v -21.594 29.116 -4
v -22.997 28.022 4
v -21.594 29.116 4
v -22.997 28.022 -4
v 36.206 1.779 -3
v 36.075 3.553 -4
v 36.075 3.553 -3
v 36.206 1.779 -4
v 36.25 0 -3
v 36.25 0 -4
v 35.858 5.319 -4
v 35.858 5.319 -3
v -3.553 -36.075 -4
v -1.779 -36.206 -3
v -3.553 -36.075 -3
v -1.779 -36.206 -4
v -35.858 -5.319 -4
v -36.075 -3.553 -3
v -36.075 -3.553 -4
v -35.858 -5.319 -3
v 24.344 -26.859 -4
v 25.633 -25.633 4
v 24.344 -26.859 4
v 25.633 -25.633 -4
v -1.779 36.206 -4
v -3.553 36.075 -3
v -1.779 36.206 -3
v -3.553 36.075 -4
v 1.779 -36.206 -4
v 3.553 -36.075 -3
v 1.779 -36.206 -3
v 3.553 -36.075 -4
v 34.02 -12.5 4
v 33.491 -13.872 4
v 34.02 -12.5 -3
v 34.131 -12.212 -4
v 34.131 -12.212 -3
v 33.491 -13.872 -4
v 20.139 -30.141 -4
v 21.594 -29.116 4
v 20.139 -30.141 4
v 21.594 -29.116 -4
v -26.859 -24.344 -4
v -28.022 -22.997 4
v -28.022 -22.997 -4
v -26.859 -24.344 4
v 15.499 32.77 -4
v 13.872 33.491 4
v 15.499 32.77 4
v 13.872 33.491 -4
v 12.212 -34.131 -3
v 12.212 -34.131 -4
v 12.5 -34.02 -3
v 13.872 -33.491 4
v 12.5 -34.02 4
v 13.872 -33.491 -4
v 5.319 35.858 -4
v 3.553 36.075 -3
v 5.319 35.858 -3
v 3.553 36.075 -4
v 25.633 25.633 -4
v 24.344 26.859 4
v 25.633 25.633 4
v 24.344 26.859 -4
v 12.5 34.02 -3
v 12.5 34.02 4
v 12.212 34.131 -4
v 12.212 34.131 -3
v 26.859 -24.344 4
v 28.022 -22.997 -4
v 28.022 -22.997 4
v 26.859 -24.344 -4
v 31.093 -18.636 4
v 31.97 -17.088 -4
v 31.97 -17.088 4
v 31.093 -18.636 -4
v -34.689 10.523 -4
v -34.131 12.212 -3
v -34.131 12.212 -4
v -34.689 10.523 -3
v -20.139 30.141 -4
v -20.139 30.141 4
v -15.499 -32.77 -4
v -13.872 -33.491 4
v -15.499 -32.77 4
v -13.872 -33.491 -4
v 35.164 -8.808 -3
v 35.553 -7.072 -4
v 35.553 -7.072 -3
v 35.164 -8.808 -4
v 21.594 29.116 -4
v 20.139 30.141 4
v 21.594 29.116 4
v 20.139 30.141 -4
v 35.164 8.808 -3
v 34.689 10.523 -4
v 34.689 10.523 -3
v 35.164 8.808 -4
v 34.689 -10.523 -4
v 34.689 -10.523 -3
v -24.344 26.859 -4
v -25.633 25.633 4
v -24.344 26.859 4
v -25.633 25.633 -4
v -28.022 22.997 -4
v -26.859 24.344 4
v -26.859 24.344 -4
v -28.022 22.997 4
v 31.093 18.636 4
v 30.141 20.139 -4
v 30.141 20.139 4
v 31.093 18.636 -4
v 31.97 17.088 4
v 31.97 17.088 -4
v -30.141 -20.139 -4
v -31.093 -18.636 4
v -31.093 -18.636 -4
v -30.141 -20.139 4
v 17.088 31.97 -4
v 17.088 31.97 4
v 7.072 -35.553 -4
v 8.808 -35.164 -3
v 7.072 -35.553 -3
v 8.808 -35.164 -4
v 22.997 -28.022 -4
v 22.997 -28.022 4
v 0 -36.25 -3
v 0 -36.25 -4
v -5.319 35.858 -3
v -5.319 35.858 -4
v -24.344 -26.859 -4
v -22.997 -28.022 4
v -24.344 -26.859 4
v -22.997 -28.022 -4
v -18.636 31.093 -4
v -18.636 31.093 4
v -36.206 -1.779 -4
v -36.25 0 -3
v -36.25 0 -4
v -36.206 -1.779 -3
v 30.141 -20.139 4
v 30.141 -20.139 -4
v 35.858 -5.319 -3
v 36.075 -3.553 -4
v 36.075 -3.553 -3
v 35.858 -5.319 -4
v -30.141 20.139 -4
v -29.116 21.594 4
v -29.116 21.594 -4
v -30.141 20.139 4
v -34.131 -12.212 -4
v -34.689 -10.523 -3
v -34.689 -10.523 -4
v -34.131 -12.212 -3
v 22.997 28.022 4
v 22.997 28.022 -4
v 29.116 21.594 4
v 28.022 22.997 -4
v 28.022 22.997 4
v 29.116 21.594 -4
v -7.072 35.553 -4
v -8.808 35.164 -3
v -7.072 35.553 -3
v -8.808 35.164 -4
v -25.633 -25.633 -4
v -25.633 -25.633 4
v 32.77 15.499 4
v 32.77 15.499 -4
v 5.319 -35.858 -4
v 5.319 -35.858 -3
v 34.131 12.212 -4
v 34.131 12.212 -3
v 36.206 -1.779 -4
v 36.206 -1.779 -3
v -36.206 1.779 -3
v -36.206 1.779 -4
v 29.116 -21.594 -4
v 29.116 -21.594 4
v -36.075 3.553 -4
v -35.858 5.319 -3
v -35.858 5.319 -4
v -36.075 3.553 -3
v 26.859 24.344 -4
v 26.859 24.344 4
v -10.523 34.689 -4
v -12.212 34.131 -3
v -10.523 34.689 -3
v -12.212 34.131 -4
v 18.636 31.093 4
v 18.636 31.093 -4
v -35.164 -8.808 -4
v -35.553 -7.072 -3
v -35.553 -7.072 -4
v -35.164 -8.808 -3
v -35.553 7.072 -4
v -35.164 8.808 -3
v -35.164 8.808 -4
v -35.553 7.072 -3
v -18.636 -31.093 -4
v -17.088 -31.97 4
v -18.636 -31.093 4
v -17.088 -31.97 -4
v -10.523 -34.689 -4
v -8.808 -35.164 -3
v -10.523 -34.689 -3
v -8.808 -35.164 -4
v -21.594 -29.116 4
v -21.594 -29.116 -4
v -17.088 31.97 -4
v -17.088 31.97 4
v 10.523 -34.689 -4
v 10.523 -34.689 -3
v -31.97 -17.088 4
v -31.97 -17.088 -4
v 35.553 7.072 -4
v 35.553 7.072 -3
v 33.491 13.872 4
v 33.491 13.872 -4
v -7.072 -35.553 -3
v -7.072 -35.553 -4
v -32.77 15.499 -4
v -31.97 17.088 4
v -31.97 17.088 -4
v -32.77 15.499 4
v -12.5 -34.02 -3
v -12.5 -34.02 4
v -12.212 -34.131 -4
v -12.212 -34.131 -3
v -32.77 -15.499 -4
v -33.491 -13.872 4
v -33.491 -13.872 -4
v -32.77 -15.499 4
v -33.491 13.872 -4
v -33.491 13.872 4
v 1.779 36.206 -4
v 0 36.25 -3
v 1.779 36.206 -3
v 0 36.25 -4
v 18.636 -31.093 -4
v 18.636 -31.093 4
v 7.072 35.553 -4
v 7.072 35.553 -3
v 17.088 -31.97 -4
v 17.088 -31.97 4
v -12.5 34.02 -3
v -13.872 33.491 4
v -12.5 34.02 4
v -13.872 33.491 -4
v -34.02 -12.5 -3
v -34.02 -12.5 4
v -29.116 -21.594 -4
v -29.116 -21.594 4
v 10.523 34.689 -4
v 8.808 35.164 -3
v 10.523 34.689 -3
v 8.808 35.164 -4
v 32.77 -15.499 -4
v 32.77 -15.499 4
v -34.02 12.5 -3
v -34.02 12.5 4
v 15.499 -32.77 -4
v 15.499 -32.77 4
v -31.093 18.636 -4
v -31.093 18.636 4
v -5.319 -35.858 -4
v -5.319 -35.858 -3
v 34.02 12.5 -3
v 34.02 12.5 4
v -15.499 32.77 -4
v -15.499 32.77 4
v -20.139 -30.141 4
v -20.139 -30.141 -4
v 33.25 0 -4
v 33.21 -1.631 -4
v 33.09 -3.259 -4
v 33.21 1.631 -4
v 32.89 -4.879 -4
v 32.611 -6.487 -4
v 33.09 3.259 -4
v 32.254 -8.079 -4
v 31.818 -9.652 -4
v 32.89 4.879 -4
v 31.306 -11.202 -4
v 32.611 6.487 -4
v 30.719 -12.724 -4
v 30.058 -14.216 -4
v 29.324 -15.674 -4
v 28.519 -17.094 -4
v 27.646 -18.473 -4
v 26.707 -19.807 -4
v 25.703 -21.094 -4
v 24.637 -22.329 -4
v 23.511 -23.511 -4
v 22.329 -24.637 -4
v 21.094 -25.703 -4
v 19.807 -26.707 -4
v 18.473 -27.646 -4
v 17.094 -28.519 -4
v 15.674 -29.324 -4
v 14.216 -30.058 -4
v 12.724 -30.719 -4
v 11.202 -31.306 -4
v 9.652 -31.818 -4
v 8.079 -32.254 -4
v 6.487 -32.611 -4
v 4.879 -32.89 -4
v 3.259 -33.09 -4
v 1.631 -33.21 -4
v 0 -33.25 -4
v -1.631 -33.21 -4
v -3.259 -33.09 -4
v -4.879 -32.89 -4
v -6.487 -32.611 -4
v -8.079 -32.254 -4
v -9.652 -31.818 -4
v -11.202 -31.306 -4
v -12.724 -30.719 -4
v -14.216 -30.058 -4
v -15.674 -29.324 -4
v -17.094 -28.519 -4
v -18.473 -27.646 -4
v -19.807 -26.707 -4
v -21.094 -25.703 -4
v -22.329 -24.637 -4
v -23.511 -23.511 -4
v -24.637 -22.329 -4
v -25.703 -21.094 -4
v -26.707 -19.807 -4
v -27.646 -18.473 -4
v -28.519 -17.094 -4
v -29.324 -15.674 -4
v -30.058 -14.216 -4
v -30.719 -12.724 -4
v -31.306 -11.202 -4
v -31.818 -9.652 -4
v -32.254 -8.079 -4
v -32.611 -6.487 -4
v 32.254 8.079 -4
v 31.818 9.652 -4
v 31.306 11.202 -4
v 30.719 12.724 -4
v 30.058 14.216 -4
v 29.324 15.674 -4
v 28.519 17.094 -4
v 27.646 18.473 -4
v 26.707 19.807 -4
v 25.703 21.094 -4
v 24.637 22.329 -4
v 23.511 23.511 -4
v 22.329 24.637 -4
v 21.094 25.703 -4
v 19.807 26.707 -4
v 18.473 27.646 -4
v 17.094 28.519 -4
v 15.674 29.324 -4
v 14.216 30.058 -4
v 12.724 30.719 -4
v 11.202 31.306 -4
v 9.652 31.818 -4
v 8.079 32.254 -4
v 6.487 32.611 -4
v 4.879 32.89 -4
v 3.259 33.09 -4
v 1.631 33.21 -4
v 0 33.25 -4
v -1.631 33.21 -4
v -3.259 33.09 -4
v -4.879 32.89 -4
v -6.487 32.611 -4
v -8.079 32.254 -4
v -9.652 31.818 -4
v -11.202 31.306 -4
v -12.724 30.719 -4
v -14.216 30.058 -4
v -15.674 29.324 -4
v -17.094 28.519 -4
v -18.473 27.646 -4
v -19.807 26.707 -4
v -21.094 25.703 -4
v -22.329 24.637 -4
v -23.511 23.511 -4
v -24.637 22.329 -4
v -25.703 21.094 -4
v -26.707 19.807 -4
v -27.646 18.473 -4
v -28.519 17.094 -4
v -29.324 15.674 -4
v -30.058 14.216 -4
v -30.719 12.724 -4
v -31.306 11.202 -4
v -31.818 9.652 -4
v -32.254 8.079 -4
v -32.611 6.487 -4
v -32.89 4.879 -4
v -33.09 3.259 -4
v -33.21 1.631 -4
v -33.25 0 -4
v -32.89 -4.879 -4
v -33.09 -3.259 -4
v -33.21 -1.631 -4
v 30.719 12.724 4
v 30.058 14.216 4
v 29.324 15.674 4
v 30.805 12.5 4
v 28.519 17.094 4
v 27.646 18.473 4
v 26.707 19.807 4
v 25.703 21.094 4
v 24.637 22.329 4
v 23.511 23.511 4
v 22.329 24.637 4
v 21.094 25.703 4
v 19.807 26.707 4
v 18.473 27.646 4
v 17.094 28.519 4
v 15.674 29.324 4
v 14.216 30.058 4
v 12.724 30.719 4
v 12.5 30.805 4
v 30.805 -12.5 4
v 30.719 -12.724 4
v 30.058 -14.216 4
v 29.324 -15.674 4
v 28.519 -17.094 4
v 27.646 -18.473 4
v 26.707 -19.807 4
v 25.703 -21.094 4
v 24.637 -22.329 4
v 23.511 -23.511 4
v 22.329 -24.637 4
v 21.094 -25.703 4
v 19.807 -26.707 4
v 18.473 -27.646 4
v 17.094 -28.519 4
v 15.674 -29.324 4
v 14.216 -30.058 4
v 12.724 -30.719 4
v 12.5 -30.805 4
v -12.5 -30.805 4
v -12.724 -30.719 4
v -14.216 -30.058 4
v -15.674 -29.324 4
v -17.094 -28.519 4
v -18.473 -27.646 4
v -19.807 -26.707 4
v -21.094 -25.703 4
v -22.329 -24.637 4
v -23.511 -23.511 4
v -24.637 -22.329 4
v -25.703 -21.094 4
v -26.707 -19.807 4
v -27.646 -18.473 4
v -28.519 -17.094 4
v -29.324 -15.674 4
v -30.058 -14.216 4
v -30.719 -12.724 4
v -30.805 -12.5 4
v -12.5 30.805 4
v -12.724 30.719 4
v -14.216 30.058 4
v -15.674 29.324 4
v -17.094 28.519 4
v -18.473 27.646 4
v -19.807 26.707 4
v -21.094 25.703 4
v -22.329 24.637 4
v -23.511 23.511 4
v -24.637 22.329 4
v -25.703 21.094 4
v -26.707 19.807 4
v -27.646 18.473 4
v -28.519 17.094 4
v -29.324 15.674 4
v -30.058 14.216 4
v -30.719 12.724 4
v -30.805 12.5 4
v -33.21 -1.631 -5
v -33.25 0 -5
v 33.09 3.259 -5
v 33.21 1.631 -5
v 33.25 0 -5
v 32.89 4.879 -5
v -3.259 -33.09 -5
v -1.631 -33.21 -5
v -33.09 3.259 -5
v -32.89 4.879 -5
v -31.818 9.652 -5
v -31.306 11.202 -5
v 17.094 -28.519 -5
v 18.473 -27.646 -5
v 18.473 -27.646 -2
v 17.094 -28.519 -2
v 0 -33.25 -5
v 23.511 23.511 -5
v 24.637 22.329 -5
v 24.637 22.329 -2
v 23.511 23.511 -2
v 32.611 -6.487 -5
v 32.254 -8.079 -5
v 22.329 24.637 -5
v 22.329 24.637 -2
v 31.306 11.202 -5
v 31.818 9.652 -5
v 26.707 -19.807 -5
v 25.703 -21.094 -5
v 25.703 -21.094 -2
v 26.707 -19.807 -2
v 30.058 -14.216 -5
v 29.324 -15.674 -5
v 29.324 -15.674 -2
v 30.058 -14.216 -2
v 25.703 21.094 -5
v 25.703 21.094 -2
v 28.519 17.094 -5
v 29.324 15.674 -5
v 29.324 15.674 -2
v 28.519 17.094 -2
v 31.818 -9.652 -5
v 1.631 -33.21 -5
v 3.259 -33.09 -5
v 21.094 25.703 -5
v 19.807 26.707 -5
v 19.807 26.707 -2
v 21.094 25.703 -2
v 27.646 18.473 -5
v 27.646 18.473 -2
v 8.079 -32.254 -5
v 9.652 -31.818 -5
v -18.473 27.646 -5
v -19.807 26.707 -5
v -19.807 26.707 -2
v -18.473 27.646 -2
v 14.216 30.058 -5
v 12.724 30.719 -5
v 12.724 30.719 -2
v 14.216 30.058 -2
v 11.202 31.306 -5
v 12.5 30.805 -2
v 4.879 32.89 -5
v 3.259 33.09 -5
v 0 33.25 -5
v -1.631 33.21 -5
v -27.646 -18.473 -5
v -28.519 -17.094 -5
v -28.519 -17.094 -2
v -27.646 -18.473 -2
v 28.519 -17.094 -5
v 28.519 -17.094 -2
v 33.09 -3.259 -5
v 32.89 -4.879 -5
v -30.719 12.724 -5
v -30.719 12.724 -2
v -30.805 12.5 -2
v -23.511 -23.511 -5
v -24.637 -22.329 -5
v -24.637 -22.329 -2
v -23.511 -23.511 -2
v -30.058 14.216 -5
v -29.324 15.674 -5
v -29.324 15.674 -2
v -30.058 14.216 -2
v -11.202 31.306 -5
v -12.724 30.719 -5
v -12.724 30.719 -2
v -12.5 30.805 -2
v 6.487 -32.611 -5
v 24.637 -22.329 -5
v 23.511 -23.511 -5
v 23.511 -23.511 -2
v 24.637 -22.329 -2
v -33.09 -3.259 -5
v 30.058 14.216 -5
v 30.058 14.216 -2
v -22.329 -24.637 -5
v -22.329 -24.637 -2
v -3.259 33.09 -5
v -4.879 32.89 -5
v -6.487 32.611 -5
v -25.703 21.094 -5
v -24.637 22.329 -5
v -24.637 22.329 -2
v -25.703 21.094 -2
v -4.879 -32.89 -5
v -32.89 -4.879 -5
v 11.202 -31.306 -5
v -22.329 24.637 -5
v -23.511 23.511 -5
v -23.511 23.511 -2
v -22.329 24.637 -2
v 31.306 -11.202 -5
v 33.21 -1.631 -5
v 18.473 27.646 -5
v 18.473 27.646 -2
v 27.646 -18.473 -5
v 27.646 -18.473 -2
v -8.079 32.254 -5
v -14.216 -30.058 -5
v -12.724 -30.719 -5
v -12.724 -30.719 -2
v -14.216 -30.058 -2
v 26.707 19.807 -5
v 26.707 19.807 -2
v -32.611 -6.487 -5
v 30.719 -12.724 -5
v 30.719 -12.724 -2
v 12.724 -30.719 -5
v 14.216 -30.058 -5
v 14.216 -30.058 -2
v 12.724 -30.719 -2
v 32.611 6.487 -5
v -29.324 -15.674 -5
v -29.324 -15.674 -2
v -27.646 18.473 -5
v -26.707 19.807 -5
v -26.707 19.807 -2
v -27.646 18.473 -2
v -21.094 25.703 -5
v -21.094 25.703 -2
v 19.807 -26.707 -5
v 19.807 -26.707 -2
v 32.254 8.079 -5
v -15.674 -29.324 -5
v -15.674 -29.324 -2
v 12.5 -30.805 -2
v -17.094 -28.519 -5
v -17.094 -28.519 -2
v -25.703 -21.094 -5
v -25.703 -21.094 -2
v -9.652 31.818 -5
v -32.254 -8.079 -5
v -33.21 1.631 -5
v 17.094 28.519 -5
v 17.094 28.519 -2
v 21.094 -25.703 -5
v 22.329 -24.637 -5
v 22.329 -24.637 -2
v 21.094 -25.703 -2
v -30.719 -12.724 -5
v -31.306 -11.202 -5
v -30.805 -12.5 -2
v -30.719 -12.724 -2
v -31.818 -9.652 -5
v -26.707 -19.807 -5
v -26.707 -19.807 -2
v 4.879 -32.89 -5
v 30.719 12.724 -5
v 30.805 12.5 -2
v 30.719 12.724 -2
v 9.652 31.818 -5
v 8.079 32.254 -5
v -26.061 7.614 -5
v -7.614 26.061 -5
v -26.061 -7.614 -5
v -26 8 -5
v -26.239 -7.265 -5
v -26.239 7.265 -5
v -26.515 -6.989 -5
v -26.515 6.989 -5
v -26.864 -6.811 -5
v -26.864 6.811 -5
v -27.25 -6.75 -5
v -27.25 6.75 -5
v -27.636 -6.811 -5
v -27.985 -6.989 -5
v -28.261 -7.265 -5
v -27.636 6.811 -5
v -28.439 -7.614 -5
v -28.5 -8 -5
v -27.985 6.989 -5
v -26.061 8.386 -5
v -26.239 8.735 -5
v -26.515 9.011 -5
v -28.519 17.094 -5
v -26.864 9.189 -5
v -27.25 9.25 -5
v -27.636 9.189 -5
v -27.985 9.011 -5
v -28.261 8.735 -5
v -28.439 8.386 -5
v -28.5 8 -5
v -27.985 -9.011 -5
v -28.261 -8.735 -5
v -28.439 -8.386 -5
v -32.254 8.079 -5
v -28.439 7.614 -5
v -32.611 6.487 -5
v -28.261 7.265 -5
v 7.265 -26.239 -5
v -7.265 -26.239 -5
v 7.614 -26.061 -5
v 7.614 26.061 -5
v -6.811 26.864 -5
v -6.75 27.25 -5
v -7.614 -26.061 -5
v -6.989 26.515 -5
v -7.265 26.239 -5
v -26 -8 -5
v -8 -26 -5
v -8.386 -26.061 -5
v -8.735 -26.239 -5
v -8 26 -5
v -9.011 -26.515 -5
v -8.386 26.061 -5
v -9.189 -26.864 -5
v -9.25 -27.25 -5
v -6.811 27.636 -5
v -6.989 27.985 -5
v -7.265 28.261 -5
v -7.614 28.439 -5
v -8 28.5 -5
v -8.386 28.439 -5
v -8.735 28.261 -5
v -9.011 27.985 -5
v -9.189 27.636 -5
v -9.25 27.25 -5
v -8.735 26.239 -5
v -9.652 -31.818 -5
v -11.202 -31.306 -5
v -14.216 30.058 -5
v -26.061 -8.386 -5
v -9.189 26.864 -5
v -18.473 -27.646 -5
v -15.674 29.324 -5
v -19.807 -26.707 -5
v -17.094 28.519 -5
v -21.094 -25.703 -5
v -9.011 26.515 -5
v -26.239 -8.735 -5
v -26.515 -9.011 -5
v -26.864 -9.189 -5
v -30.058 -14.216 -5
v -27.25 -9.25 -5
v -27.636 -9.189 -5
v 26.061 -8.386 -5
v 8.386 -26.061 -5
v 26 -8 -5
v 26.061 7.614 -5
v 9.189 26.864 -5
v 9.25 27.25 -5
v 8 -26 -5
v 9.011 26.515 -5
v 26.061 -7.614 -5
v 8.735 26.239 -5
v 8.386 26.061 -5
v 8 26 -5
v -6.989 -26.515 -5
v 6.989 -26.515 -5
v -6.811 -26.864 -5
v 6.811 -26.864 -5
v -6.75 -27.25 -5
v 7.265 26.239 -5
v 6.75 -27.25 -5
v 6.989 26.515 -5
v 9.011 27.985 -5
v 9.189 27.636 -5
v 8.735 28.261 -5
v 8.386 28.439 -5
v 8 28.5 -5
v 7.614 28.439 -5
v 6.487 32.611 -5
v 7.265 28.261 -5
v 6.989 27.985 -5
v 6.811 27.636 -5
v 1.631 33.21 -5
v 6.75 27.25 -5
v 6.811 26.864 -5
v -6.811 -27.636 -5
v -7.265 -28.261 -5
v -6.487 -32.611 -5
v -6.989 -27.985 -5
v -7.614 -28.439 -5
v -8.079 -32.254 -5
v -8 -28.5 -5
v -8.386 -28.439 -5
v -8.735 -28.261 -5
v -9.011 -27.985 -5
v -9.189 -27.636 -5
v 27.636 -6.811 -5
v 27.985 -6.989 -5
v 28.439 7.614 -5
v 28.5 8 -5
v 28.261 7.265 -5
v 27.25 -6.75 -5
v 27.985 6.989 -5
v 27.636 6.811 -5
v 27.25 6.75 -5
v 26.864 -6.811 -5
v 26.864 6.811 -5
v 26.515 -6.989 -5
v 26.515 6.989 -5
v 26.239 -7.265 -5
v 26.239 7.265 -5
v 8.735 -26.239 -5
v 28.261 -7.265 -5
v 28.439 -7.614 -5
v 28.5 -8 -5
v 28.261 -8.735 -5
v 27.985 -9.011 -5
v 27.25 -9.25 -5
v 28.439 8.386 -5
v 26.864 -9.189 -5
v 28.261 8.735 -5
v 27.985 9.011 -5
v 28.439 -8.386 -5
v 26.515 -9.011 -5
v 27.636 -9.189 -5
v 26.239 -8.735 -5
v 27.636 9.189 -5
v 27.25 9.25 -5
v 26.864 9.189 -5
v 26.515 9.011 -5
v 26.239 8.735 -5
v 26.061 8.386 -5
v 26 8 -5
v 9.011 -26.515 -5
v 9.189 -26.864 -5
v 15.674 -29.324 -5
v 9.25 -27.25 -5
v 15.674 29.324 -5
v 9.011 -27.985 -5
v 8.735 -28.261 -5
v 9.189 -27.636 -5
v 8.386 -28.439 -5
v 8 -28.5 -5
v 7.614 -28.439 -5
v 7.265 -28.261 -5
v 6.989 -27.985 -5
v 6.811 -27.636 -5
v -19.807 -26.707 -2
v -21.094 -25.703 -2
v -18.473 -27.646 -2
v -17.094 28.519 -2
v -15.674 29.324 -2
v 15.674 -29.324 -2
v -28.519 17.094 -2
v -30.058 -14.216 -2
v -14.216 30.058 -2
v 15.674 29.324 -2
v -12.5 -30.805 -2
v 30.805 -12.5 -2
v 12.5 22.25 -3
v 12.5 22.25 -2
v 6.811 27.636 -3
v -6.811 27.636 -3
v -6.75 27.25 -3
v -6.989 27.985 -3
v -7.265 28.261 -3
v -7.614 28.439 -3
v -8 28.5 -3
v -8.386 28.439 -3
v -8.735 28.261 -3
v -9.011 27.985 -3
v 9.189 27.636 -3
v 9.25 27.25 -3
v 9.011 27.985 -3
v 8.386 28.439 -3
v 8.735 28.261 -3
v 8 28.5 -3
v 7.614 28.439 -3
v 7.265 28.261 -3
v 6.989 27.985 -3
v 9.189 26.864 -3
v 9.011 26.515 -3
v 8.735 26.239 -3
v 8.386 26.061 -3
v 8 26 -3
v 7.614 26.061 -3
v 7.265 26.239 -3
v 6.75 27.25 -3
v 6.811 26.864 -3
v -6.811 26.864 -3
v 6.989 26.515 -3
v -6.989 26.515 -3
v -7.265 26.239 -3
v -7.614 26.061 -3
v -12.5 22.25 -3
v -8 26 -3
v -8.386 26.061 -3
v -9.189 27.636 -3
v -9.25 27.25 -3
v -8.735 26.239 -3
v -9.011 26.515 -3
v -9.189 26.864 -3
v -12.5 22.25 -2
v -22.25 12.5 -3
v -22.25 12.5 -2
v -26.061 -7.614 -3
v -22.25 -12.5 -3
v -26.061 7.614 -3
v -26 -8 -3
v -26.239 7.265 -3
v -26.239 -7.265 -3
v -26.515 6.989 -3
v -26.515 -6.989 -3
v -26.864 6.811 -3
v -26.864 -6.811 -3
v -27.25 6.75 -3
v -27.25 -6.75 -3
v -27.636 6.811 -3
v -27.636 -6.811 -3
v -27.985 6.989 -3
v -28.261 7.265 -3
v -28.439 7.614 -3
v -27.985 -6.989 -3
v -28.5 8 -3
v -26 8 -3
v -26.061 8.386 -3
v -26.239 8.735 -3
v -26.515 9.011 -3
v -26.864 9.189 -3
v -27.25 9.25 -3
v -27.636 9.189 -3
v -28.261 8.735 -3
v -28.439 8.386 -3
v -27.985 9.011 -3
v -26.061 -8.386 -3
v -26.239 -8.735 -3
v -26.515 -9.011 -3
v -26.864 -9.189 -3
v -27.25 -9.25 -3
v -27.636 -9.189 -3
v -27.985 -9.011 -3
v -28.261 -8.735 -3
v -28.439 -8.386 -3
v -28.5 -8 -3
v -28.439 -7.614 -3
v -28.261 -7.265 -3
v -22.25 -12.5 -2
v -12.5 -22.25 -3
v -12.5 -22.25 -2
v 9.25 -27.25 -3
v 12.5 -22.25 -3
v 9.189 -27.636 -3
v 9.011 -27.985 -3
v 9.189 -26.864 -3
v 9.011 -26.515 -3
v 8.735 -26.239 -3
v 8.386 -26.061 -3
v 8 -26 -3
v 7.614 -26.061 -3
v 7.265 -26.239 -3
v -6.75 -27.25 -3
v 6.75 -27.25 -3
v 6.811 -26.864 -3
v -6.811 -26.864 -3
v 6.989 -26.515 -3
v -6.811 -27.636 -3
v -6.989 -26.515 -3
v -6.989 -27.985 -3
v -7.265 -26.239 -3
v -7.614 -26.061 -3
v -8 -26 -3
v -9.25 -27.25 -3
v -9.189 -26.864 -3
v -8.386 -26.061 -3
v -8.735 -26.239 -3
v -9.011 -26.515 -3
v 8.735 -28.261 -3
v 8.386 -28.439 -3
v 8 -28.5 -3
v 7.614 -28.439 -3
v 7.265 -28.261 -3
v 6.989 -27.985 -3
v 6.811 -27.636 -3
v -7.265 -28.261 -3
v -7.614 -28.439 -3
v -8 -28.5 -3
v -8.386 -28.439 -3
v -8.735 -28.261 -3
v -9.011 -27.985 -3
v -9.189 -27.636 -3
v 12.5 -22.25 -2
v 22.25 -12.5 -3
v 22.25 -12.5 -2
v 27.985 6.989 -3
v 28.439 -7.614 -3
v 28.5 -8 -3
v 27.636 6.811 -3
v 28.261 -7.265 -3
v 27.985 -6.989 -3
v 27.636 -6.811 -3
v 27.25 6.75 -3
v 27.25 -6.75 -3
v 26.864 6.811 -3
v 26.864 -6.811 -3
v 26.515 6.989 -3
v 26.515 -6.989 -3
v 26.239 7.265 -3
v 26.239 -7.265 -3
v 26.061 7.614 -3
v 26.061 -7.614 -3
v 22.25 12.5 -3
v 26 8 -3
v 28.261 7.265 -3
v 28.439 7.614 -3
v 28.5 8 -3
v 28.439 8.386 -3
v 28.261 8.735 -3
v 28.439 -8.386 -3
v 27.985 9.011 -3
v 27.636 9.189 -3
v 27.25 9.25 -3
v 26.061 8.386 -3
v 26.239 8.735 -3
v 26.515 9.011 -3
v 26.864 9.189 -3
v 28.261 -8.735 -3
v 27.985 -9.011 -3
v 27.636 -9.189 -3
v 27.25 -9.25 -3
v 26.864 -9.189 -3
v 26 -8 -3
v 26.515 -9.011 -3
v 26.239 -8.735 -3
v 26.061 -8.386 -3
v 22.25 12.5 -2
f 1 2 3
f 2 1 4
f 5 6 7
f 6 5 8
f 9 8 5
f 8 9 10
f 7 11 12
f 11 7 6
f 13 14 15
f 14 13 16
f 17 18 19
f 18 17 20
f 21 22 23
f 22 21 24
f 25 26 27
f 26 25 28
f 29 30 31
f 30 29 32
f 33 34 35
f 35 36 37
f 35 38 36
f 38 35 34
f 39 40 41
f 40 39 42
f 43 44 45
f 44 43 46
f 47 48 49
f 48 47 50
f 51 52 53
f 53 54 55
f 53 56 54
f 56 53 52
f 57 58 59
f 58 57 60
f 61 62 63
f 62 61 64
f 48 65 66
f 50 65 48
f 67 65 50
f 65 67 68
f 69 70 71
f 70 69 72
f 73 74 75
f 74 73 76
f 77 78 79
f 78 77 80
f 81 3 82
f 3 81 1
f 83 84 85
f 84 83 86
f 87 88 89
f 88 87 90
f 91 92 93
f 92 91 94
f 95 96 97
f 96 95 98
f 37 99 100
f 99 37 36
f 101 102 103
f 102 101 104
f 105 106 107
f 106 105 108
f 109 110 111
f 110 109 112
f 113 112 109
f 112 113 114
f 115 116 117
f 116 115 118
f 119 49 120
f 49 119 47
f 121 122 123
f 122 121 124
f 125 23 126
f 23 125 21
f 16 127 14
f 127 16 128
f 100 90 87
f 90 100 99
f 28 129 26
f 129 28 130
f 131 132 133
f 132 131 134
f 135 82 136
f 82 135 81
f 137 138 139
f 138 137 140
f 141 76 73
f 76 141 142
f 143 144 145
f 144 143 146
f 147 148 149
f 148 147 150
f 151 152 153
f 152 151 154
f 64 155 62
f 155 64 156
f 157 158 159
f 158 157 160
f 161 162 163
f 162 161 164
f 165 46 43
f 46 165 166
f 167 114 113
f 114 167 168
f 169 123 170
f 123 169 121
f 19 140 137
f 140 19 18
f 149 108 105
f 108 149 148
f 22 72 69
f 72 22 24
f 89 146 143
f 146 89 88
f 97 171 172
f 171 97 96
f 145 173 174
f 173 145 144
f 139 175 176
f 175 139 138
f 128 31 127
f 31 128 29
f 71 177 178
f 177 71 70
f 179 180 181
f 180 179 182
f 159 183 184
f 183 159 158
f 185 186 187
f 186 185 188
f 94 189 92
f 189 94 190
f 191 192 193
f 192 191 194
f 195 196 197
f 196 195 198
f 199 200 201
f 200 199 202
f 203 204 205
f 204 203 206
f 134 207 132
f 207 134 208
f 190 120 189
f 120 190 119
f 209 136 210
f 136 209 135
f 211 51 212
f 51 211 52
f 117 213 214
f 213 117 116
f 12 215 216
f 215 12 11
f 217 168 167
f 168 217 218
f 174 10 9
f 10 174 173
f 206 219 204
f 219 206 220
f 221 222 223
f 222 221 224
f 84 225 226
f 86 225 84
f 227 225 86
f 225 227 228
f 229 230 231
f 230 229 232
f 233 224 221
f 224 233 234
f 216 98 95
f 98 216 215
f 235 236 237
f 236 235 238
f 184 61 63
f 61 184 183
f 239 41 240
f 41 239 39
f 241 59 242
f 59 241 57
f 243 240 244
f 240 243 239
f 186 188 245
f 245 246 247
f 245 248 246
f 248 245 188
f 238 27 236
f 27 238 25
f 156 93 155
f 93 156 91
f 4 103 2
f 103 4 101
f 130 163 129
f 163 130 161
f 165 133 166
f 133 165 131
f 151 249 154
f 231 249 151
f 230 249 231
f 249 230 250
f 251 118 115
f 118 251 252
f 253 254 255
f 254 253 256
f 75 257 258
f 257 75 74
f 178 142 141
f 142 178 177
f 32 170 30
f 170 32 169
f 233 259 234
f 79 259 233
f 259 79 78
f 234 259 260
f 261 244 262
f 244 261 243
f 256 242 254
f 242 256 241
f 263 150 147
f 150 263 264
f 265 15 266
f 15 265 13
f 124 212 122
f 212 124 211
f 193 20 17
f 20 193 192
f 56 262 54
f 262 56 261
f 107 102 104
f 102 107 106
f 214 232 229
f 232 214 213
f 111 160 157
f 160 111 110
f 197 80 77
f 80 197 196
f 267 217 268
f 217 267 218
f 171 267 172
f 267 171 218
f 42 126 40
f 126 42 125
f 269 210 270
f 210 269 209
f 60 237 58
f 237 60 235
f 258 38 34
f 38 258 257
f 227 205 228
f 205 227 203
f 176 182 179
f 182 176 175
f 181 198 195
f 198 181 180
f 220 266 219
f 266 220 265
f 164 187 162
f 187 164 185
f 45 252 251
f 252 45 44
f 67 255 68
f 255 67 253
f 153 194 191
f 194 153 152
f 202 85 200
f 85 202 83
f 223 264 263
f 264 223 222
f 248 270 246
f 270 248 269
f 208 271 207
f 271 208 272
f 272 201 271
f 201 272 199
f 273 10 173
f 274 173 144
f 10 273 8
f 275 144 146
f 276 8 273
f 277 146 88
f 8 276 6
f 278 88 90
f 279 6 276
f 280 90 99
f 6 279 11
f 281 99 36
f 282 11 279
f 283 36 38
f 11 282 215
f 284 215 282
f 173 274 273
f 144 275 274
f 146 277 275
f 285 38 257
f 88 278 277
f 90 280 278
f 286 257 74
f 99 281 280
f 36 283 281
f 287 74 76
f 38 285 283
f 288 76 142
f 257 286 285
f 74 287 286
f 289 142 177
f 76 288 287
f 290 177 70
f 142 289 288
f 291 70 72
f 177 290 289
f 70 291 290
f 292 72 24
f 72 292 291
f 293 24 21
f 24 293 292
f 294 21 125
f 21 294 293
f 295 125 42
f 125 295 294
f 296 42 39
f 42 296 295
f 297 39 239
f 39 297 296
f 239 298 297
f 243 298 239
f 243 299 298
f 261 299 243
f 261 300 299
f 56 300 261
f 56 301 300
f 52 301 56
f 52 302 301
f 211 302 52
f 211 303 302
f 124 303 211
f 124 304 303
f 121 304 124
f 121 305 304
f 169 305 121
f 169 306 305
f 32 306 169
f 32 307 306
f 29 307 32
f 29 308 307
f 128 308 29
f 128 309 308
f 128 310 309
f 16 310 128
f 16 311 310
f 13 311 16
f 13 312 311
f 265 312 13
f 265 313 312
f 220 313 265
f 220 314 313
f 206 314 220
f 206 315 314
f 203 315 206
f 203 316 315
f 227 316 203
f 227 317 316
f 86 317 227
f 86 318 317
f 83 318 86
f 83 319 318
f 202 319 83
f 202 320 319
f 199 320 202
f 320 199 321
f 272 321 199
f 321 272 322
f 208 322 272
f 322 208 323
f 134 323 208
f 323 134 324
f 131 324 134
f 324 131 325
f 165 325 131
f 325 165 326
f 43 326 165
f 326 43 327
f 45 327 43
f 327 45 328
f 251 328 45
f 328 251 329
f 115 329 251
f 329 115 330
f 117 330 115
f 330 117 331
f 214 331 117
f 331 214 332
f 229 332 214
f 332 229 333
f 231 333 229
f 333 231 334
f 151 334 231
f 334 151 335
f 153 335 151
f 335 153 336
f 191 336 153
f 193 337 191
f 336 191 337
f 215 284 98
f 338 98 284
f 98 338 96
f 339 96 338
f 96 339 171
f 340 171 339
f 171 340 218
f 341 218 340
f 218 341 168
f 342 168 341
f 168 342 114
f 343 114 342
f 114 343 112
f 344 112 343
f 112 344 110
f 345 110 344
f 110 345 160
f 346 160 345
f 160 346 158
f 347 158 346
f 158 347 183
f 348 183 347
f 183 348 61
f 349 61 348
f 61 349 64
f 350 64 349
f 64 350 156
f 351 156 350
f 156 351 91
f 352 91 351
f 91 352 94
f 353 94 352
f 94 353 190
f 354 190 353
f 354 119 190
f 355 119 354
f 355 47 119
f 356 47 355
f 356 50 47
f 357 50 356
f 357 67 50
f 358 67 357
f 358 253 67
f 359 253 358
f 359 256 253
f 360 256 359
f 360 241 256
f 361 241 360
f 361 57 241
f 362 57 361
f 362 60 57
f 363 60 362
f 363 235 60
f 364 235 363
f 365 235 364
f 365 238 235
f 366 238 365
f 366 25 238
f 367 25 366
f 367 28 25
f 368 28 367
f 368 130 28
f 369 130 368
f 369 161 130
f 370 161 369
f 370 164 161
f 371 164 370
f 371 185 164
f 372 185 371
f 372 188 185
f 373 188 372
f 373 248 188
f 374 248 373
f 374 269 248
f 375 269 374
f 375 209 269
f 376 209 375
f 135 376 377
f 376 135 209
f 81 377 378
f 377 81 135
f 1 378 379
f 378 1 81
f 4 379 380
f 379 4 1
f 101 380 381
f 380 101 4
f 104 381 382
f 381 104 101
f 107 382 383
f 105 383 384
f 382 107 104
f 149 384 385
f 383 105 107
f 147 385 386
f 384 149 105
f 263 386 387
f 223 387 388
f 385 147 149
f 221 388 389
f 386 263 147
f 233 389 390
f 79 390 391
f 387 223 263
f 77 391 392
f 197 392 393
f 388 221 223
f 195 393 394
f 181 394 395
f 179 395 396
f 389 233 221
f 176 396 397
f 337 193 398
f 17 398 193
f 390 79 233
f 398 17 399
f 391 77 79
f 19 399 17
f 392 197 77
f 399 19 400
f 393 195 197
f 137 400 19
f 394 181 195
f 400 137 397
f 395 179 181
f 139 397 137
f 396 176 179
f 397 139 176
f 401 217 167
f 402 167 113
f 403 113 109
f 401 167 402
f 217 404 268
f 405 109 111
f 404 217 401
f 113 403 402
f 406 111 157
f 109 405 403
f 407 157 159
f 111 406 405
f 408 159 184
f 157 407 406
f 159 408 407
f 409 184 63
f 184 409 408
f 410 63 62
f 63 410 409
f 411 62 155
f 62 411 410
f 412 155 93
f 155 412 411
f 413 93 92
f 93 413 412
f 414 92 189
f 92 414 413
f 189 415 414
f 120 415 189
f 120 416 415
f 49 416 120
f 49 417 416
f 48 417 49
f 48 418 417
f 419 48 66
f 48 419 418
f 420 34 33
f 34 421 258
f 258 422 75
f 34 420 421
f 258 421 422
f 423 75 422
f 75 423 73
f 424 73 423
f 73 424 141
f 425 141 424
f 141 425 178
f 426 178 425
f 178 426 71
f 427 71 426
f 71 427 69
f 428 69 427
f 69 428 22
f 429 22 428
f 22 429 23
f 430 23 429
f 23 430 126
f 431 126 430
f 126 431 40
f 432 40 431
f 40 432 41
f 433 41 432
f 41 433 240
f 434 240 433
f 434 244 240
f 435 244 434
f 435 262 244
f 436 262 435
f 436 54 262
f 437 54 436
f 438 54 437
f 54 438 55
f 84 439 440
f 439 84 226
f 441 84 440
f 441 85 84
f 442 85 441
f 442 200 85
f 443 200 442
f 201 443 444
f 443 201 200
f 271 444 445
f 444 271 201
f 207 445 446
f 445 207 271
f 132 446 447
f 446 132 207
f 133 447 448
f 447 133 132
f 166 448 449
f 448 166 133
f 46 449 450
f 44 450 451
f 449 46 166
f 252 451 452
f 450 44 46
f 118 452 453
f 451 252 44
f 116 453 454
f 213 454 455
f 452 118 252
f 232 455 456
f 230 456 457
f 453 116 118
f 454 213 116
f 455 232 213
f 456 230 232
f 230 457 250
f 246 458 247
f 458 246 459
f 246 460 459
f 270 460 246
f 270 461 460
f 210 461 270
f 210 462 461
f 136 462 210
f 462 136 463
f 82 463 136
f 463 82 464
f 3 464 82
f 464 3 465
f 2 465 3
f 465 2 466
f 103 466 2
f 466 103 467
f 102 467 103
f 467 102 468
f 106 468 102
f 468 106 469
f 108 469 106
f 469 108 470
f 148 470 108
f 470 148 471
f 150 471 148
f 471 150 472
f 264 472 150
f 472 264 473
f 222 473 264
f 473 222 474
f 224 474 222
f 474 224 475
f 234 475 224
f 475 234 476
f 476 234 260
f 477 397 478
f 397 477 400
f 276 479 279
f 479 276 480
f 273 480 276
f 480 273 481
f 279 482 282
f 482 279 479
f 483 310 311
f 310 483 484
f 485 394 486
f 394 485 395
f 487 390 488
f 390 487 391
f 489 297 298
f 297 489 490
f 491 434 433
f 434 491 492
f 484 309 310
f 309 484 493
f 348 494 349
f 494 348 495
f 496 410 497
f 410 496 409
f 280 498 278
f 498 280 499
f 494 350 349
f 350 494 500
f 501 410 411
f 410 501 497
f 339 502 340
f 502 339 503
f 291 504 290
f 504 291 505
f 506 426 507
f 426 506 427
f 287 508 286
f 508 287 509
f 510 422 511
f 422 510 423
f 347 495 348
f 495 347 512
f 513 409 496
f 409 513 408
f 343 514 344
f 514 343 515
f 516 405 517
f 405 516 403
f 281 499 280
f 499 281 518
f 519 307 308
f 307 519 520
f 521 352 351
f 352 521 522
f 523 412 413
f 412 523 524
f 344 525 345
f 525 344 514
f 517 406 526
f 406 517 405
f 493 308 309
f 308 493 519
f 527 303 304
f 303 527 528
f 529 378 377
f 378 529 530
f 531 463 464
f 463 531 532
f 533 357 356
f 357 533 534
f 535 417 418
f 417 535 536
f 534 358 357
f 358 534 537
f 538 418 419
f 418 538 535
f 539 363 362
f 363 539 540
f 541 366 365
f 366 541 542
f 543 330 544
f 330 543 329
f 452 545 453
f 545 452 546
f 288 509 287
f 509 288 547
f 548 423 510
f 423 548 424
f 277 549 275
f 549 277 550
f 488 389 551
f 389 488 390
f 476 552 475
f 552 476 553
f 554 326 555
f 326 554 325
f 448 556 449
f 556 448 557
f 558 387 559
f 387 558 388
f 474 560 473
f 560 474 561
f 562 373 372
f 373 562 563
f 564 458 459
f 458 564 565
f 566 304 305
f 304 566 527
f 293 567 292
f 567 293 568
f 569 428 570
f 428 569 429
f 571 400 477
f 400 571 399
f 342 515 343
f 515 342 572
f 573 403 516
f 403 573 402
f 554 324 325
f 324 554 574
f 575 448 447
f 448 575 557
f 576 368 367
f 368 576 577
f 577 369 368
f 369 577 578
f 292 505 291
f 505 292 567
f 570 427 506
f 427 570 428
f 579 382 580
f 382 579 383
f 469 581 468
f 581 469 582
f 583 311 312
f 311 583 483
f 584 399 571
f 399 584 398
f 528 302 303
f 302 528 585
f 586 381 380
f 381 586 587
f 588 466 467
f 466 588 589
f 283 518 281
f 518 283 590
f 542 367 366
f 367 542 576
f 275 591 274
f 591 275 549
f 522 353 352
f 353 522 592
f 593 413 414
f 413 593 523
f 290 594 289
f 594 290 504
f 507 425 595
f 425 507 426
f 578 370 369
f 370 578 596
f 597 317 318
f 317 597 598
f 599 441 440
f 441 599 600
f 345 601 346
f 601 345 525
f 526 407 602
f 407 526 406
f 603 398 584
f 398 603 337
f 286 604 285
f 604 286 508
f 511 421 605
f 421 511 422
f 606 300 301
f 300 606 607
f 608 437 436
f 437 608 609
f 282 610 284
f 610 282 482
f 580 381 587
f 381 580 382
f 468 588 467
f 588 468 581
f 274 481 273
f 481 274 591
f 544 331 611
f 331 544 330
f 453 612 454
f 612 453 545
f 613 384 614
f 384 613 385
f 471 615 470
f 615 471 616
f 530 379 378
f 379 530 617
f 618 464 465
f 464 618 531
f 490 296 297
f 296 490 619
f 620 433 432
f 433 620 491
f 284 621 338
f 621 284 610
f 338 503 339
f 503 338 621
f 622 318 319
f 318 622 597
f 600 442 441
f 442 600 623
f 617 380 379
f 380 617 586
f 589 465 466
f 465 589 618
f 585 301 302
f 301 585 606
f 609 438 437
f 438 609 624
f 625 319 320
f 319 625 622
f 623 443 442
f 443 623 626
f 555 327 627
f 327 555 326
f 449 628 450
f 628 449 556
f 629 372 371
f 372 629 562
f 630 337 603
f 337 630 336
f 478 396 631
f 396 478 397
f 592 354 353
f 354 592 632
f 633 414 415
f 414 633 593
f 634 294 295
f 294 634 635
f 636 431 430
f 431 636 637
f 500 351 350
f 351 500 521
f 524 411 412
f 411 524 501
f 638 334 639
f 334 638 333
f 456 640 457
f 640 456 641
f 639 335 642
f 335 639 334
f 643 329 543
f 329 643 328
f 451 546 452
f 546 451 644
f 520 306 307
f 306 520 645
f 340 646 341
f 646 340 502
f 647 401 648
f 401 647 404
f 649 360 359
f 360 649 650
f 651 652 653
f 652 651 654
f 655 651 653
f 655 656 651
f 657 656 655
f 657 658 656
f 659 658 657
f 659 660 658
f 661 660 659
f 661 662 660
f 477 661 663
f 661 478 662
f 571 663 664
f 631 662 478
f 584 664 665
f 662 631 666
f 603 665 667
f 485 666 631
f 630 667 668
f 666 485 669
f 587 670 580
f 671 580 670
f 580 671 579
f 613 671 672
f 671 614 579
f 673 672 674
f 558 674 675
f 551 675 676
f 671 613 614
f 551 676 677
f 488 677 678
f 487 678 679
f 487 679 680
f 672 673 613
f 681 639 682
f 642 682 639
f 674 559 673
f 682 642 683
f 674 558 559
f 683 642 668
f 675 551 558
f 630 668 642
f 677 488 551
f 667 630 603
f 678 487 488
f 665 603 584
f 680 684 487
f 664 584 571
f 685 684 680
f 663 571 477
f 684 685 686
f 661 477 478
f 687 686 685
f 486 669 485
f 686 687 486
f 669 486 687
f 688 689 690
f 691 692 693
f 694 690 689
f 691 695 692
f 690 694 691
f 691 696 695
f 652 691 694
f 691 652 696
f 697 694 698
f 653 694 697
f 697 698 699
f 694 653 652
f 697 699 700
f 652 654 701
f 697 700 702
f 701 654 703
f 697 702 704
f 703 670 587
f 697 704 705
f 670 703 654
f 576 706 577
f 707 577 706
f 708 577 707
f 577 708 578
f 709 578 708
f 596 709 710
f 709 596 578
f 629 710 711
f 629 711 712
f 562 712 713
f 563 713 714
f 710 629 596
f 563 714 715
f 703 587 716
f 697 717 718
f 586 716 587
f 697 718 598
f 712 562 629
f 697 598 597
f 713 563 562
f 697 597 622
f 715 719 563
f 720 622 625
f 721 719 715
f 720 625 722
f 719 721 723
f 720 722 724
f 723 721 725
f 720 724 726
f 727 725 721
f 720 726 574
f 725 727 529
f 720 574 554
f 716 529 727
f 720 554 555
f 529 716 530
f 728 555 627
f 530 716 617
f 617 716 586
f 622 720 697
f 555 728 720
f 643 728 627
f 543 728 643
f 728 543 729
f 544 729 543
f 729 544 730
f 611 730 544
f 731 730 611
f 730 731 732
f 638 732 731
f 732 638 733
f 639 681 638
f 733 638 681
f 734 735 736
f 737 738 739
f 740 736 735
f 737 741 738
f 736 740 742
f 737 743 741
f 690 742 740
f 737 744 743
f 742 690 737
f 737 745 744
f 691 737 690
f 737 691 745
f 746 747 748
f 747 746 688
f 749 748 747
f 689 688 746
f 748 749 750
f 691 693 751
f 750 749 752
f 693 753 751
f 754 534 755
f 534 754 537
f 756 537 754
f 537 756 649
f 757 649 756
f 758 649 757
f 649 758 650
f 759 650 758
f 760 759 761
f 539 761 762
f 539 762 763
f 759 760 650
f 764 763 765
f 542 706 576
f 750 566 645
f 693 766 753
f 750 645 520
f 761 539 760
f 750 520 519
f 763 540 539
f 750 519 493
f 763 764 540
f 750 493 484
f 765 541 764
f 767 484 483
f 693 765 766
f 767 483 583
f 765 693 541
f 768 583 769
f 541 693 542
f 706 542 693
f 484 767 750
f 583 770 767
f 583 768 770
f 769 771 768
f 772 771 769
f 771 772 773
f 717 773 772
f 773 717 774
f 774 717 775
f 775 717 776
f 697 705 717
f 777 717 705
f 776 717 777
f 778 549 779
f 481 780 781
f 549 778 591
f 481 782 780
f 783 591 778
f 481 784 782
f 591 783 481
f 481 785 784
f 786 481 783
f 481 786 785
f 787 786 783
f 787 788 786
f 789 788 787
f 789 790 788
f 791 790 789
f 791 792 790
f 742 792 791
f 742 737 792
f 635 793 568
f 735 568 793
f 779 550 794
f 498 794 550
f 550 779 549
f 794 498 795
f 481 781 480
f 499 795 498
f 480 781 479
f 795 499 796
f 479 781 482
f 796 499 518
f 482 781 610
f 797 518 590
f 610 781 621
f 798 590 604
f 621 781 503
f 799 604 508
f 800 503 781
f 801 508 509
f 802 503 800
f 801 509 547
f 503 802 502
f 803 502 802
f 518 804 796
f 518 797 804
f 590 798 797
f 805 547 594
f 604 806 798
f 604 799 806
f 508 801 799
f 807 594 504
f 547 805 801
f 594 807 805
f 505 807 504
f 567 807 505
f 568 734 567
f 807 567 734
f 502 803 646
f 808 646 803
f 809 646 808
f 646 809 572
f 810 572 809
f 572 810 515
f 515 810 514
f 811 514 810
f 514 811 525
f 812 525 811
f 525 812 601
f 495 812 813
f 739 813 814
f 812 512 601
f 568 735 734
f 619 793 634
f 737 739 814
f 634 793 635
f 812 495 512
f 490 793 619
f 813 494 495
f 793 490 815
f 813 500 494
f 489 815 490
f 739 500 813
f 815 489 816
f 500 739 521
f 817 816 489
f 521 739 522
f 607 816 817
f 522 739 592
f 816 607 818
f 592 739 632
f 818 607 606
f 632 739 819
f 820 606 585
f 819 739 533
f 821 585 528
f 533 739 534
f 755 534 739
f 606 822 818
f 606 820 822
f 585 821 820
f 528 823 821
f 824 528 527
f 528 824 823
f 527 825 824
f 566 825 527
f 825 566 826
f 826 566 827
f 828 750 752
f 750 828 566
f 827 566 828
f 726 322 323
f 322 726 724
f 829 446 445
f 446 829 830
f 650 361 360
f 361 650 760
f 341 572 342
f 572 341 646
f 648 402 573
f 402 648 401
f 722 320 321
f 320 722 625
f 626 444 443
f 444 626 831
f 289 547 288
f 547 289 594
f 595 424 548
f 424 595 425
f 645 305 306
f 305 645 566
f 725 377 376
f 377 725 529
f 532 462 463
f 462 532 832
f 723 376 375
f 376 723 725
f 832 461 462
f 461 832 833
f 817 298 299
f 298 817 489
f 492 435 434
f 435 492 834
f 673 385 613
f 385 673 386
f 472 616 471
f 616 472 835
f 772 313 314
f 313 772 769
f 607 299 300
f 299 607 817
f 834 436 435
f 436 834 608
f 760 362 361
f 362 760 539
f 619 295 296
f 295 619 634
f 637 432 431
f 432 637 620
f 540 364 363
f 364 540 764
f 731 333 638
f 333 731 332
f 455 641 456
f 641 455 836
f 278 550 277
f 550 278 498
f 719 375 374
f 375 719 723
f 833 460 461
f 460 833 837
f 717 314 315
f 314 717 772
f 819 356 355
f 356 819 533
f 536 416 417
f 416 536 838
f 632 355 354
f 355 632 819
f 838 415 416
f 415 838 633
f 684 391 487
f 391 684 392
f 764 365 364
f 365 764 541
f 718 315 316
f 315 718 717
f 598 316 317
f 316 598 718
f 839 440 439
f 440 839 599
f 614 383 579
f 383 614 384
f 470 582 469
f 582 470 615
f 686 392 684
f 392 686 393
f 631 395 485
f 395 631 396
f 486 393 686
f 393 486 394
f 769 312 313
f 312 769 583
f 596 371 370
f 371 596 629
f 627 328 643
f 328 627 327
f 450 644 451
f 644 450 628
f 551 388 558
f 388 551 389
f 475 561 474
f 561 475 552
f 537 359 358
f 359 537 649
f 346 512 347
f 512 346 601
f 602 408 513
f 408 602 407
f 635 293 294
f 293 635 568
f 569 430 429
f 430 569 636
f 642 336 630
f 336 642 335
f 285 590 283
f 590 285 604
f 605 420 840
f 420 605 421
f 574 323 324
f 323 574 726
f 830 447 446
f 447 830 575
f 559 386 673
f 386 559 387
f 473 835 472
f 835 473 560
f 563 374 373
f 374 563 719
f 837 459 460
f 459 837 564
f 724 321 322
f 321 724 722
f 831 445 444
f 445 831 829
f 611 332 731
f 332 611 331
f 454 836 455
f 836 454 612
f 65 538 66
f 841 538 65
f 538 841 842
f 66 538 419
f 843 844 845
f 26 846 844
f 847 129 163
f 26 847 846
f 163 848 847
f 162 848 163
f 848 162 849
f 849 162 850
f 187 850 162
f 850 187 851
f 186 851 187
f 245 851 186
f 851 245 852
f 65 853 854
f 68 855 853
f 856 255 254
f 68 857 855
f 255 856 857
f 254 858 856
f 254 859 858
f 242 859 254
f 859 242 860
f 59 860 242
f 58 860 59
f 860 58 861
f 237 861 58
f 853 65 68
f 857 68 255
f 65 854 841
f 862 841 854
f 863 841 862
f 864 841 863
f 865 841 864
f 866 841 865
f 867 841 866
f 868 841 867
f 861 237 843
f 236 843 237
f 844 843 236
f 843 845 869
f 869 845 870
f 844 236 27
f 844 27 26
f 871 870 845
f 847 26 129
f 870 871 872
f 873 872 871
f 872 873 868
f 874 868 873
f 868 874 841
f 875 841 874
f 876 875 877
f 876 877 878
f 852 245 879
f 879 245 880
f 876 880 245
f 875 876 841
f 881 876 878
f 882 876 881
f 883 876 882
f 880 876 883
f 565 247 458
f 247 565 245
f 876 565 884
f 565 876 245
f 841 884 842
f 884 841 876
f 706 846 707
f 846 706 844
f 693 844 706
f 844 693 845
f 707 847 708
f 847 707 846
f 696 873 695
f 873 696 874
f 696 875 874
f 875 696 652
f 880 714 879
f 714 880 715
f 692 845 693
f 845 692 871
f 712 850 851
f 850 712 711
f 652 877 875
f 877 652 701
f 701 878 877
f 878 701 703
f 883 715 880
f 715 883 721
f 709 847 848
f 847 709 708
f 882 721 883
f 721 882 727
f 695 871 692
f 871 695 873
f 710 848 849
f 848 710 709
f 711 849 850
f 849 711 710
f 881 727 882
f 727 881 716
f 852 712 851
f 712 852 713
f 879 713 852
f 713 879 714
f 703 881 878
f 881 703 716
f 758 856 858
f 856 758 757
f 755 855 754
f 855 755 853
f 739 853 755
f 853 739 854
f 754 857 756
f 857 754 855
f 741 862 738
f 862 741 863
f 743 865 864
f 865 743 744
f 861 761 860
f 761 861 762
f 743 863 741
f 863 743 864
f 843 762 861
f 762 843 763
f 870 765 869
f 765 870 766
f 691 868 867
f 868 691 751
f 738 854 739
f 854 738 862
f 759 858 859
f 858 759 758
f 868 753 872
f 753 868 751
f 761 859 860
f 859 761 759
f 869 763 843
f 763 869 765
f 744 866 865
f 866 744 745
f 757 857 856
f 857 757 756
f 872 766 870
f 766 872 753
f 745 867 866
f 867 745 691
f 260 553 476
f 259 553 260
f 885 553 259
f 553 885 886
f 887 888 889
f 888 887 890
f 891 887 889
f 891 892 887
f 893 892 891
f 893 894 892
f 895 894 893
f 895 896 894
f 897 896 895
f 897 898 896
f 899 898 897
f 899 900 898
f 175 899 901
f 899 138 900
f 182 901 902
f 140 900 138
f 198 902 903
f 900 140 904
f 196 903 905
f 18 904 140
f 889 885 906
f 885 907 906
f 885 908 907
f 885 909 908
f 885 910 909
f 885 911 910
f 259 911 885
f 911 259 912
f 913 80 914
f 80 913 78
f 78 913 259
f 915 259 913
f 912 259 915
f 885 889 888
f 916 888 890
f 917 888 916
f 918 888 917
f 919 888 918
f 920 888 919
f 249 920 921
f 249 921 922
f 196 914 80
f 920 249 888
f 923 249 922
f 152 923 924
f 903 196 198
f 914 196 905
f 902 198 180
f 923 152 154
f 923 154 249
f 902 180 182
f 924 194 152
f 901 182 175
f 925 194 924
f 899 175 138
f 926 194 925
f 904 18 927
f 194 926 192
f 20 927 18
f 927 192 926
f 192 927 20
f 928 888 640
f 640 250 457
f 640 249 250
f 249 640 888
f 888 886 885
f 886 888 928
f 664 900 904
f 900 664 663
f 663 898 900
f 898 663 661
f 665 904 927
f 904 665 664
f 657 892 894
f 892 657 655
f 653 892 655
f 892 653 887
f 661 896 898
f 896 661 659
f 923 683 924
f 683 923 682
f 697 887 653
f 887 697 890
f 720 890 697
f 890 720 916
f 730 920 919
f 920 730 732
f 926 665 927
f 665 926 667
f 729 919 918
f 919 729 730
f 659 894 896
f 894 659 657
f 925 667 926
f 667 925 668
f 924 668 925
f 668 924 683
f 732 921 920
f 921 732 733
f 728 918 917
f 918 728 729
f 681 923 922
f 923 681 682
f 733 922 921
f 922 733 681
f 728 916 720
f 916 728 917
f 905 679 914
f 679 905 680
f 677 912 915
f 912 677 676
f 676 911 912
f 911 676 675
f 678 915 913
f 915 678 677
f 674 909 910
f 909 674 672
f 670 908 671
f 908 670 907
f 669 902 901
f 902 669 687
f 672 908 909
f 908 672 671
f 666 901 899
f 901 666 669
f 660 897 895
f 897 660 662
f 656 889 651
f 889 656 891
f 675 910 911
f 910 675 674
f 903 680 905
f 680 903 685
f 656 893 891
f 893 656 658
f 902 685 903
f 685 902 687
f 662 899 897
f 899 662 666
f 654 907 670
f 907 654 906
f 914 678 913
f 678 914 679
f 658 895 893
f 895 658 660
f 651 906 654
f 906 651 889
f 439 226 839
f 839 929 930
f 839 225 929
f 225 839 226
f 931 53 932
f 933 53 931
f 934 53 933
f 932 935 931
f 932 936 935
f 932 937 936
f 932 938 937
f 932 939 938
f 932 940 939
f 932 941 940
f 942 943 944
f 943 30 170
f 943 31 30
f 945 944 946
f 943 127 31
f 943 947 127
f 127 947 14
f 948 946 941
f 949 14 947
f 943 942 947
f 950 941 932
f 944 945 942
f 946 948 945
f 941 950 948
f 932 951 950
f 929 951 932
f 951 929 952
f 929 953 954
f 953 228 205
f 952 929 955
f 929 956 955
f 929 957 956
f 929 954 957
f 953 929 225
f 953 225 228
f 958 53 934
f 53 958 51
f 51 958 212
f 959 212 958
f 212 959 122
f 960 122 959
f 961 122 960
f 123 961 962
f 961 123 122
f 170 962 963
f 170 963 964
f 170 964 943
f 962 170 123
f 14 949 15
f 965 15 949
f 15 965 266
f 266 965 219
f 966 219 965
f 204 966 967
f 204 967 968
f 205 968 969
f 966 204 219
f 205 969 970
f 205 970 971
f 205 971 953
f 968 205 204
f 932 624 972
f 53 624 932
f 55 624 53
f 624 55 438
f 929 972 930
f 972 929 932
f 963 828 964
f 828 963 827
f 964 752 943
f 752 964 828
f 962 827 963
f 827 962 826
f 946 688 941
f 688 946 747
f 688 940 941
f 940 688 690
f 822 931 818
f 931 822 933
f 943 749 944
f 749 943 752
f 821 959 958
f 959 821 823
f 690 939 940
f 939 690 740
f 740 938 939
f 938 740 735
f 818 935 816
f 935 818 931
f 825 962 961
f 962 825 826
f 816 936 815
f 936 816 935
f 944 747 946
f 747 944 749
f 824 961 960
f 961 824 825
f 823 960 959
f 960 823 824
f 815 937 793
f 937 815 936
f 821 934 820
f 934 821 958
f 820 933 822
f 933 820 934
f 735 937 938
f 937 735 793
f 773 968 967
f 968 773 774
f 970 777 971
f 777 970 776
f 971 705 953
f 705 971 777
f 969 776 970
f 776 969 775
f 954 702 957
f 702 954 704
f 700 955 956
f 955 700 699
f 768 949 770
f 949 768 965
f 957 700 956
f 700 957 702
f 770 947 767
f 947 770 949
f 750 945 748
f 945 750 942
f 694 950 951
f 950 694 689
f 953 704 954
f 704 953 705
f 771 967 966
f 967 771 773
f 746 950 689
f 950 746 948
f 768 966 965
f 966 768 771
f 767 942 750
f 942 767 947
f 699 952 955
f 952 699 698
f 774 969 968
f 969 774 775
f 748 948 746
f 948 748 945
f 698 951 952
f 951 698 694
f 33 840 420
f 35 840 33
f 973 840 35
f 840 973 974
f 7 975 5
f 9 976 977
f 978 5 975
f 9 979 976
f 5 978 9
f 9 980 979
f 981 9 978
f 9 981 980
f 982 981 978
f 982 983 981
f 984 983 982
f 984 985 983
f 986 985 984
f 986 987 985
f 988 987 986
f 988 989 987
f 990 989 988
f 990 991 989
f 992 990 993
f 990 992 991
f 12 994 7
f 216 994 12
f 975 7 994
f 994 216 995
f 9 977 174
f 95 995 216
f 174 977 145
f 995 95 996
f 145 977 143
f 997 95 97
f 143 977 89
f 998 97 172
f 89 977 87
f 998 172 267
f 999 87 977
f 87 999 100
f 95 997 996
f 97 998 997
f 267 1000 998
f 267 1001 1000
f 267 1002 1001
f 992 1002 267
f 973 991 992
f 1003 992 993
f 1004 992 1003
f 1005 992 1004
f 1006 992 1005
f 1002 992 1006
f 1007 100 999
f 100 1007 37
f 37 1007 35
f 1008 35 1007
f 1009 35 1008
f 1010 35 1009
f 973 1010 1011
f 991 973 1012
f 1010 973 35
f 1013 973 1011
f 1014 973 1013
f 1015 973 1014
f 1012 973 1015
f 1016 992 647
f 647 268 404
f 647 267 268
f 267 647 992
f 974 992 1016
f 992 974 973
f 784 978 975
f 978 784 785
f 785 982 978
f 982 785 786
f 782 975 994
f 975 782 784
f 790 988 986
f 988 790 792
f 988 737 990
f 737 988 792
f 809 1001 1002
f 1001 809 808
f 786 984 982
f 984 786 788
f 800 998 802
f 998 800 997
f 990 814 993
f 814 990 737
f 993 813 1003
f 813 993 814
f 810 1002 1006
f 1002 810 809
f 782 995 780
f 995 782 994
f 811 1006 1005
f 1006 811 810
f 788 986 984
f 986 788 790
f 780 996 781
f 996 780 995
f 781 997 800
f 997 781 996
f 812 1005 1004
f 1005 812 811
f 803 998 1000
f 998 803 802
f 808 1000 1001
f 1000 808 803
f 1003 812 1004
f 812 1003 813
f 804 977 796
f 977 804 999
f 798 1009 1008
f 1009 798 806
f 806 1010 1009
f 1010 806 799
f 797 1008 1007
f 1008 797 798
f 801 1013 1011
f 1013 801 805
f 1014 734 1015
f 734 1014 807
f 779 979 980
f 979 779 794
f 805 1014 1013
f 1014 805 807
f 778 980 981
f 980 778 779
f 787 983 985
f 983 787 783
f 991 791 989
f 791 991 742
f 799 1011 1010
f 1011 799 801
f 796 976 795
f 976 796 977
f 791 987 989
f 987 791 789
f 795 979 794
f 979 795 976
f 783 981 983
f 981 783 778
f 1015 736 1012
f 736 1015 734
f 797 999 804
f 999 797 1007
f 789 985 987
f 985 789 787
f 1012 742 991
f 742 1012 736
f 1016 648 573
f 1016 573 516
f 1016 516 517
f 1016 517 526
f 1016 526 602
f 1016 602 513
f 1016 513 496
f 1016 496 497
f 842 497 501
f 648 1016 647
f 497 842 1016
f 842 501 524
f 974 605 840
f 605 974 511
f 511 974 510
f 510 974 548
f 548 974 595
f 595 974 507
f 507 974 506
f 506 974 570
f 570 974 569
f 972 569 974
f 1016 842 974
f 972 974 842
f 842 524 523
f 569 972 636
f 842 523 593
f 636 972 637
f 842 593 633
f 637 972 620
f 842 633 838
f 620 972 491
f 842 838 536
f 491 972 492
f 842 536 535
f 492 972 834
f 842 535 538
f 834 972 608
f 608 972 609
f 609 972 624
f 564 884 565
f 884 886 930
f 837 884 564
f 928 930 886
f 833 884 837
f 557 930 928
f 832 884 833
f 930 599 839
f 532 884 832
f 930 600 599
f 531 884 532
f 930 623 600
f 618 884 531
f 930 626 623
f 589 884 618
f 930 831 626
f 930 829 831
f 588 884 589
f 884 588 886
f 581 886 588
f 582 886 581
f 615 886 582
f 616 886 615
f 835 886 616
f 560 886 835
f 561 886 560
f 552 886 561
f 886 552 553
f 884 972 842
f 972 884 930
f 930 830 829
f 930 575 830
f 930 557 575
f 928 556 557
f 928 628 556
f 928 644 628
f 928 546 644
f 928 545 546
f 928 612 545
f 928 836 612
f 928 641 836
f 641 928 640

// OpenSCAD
// IGNIS 4-Servo Mount Ring with Base Plate (Cruciform / "+" Configuration)
// Fits inside 75mm PVC pipe (ID ≈ 73mm)
// Servo: standard 9g micro (e.g., SG90, MG90S)

// ========== PARAMETERS ==========
pipe_id = 73;               // inner diameter of 75mm pipe (mm)
ring_height = 8;            // thickness of the ring wall (mm)
base_thick = 3;             // thickness of the base plate (mm)
wall_thick = 3;             // wall thickness of the ring
servo_width = 23;           // servo width (mm)
servo_depth = 12;           // servo depth (mm)
screw_dia = 2.5;            // M2.5 screw hole diameter (mm)
screw_offset = 8;           // screw hole distance from center (mm)

// derived
ring_od = pipe_id - 0.5;    // outer diameter for snug fit (mm)
ring_id = ring_od - 2*wall_thick; // inner diameter
pocket_width = servo_width + 2;   // clearance
pocket_depth = servo_depth + 2;   // clearance
total_height = ring_height + base_thick;

// ========== MODULES ==========
module servo_pocket() {
    // cutout only through the ring portion (not the base)
    translate([0, 0, base_thick/2])
        cube([pocket_width, pocket_depth, ring_height + 1], center = true);
}

module screw_hole() {
    // screw hole goes through the base plate and ring
    cylinder(d = screw_dia, h = total_height + 1, center = true, $fn = 20);
}

module servo_mount_ring() {
    difference() {
        union() {
            // base plate (solid disk)
            cylinder(h = base_thick, d = ring_od, center = true, $fn = 128);
            // ring wall
            cylinder(h = ring_height, d = ring_od, center = true, $fn = 128);
            cylinder(h = ring_height + 2, d = ring_id, center = true, $fn = 128);
        }
        
        // cutout the inner part of the ring (but not the base)
        translate([0, 0, base_thick])
            cylinder(h = ring_height + 2, d = ring_id, center = true, $fn = 128);
        
        // 4 servo pockets at 0°, 90°, 180°, 270°
        for (angle = [0, 90, 180, 270]) {
            rotate([0, 0, angle]) {
                // servo pocket cutout (only through ring, not base)
                translate([0, ring_od/2 - pocket_depth/2, 0])
                    servo_pocket();
                
                // screw holes (two per servo, on either side of pocket)
                translate([-screw_offset, ring_od/2 - pocket_depth/2 - 2, 0])
                    screw_hole();
                translate([screw_offset, ring_od/2 - pocket_depth/2 - 2, 0])
                    screw_hole();
            }
        }
    }
}

// render
servo_mount_ring();
